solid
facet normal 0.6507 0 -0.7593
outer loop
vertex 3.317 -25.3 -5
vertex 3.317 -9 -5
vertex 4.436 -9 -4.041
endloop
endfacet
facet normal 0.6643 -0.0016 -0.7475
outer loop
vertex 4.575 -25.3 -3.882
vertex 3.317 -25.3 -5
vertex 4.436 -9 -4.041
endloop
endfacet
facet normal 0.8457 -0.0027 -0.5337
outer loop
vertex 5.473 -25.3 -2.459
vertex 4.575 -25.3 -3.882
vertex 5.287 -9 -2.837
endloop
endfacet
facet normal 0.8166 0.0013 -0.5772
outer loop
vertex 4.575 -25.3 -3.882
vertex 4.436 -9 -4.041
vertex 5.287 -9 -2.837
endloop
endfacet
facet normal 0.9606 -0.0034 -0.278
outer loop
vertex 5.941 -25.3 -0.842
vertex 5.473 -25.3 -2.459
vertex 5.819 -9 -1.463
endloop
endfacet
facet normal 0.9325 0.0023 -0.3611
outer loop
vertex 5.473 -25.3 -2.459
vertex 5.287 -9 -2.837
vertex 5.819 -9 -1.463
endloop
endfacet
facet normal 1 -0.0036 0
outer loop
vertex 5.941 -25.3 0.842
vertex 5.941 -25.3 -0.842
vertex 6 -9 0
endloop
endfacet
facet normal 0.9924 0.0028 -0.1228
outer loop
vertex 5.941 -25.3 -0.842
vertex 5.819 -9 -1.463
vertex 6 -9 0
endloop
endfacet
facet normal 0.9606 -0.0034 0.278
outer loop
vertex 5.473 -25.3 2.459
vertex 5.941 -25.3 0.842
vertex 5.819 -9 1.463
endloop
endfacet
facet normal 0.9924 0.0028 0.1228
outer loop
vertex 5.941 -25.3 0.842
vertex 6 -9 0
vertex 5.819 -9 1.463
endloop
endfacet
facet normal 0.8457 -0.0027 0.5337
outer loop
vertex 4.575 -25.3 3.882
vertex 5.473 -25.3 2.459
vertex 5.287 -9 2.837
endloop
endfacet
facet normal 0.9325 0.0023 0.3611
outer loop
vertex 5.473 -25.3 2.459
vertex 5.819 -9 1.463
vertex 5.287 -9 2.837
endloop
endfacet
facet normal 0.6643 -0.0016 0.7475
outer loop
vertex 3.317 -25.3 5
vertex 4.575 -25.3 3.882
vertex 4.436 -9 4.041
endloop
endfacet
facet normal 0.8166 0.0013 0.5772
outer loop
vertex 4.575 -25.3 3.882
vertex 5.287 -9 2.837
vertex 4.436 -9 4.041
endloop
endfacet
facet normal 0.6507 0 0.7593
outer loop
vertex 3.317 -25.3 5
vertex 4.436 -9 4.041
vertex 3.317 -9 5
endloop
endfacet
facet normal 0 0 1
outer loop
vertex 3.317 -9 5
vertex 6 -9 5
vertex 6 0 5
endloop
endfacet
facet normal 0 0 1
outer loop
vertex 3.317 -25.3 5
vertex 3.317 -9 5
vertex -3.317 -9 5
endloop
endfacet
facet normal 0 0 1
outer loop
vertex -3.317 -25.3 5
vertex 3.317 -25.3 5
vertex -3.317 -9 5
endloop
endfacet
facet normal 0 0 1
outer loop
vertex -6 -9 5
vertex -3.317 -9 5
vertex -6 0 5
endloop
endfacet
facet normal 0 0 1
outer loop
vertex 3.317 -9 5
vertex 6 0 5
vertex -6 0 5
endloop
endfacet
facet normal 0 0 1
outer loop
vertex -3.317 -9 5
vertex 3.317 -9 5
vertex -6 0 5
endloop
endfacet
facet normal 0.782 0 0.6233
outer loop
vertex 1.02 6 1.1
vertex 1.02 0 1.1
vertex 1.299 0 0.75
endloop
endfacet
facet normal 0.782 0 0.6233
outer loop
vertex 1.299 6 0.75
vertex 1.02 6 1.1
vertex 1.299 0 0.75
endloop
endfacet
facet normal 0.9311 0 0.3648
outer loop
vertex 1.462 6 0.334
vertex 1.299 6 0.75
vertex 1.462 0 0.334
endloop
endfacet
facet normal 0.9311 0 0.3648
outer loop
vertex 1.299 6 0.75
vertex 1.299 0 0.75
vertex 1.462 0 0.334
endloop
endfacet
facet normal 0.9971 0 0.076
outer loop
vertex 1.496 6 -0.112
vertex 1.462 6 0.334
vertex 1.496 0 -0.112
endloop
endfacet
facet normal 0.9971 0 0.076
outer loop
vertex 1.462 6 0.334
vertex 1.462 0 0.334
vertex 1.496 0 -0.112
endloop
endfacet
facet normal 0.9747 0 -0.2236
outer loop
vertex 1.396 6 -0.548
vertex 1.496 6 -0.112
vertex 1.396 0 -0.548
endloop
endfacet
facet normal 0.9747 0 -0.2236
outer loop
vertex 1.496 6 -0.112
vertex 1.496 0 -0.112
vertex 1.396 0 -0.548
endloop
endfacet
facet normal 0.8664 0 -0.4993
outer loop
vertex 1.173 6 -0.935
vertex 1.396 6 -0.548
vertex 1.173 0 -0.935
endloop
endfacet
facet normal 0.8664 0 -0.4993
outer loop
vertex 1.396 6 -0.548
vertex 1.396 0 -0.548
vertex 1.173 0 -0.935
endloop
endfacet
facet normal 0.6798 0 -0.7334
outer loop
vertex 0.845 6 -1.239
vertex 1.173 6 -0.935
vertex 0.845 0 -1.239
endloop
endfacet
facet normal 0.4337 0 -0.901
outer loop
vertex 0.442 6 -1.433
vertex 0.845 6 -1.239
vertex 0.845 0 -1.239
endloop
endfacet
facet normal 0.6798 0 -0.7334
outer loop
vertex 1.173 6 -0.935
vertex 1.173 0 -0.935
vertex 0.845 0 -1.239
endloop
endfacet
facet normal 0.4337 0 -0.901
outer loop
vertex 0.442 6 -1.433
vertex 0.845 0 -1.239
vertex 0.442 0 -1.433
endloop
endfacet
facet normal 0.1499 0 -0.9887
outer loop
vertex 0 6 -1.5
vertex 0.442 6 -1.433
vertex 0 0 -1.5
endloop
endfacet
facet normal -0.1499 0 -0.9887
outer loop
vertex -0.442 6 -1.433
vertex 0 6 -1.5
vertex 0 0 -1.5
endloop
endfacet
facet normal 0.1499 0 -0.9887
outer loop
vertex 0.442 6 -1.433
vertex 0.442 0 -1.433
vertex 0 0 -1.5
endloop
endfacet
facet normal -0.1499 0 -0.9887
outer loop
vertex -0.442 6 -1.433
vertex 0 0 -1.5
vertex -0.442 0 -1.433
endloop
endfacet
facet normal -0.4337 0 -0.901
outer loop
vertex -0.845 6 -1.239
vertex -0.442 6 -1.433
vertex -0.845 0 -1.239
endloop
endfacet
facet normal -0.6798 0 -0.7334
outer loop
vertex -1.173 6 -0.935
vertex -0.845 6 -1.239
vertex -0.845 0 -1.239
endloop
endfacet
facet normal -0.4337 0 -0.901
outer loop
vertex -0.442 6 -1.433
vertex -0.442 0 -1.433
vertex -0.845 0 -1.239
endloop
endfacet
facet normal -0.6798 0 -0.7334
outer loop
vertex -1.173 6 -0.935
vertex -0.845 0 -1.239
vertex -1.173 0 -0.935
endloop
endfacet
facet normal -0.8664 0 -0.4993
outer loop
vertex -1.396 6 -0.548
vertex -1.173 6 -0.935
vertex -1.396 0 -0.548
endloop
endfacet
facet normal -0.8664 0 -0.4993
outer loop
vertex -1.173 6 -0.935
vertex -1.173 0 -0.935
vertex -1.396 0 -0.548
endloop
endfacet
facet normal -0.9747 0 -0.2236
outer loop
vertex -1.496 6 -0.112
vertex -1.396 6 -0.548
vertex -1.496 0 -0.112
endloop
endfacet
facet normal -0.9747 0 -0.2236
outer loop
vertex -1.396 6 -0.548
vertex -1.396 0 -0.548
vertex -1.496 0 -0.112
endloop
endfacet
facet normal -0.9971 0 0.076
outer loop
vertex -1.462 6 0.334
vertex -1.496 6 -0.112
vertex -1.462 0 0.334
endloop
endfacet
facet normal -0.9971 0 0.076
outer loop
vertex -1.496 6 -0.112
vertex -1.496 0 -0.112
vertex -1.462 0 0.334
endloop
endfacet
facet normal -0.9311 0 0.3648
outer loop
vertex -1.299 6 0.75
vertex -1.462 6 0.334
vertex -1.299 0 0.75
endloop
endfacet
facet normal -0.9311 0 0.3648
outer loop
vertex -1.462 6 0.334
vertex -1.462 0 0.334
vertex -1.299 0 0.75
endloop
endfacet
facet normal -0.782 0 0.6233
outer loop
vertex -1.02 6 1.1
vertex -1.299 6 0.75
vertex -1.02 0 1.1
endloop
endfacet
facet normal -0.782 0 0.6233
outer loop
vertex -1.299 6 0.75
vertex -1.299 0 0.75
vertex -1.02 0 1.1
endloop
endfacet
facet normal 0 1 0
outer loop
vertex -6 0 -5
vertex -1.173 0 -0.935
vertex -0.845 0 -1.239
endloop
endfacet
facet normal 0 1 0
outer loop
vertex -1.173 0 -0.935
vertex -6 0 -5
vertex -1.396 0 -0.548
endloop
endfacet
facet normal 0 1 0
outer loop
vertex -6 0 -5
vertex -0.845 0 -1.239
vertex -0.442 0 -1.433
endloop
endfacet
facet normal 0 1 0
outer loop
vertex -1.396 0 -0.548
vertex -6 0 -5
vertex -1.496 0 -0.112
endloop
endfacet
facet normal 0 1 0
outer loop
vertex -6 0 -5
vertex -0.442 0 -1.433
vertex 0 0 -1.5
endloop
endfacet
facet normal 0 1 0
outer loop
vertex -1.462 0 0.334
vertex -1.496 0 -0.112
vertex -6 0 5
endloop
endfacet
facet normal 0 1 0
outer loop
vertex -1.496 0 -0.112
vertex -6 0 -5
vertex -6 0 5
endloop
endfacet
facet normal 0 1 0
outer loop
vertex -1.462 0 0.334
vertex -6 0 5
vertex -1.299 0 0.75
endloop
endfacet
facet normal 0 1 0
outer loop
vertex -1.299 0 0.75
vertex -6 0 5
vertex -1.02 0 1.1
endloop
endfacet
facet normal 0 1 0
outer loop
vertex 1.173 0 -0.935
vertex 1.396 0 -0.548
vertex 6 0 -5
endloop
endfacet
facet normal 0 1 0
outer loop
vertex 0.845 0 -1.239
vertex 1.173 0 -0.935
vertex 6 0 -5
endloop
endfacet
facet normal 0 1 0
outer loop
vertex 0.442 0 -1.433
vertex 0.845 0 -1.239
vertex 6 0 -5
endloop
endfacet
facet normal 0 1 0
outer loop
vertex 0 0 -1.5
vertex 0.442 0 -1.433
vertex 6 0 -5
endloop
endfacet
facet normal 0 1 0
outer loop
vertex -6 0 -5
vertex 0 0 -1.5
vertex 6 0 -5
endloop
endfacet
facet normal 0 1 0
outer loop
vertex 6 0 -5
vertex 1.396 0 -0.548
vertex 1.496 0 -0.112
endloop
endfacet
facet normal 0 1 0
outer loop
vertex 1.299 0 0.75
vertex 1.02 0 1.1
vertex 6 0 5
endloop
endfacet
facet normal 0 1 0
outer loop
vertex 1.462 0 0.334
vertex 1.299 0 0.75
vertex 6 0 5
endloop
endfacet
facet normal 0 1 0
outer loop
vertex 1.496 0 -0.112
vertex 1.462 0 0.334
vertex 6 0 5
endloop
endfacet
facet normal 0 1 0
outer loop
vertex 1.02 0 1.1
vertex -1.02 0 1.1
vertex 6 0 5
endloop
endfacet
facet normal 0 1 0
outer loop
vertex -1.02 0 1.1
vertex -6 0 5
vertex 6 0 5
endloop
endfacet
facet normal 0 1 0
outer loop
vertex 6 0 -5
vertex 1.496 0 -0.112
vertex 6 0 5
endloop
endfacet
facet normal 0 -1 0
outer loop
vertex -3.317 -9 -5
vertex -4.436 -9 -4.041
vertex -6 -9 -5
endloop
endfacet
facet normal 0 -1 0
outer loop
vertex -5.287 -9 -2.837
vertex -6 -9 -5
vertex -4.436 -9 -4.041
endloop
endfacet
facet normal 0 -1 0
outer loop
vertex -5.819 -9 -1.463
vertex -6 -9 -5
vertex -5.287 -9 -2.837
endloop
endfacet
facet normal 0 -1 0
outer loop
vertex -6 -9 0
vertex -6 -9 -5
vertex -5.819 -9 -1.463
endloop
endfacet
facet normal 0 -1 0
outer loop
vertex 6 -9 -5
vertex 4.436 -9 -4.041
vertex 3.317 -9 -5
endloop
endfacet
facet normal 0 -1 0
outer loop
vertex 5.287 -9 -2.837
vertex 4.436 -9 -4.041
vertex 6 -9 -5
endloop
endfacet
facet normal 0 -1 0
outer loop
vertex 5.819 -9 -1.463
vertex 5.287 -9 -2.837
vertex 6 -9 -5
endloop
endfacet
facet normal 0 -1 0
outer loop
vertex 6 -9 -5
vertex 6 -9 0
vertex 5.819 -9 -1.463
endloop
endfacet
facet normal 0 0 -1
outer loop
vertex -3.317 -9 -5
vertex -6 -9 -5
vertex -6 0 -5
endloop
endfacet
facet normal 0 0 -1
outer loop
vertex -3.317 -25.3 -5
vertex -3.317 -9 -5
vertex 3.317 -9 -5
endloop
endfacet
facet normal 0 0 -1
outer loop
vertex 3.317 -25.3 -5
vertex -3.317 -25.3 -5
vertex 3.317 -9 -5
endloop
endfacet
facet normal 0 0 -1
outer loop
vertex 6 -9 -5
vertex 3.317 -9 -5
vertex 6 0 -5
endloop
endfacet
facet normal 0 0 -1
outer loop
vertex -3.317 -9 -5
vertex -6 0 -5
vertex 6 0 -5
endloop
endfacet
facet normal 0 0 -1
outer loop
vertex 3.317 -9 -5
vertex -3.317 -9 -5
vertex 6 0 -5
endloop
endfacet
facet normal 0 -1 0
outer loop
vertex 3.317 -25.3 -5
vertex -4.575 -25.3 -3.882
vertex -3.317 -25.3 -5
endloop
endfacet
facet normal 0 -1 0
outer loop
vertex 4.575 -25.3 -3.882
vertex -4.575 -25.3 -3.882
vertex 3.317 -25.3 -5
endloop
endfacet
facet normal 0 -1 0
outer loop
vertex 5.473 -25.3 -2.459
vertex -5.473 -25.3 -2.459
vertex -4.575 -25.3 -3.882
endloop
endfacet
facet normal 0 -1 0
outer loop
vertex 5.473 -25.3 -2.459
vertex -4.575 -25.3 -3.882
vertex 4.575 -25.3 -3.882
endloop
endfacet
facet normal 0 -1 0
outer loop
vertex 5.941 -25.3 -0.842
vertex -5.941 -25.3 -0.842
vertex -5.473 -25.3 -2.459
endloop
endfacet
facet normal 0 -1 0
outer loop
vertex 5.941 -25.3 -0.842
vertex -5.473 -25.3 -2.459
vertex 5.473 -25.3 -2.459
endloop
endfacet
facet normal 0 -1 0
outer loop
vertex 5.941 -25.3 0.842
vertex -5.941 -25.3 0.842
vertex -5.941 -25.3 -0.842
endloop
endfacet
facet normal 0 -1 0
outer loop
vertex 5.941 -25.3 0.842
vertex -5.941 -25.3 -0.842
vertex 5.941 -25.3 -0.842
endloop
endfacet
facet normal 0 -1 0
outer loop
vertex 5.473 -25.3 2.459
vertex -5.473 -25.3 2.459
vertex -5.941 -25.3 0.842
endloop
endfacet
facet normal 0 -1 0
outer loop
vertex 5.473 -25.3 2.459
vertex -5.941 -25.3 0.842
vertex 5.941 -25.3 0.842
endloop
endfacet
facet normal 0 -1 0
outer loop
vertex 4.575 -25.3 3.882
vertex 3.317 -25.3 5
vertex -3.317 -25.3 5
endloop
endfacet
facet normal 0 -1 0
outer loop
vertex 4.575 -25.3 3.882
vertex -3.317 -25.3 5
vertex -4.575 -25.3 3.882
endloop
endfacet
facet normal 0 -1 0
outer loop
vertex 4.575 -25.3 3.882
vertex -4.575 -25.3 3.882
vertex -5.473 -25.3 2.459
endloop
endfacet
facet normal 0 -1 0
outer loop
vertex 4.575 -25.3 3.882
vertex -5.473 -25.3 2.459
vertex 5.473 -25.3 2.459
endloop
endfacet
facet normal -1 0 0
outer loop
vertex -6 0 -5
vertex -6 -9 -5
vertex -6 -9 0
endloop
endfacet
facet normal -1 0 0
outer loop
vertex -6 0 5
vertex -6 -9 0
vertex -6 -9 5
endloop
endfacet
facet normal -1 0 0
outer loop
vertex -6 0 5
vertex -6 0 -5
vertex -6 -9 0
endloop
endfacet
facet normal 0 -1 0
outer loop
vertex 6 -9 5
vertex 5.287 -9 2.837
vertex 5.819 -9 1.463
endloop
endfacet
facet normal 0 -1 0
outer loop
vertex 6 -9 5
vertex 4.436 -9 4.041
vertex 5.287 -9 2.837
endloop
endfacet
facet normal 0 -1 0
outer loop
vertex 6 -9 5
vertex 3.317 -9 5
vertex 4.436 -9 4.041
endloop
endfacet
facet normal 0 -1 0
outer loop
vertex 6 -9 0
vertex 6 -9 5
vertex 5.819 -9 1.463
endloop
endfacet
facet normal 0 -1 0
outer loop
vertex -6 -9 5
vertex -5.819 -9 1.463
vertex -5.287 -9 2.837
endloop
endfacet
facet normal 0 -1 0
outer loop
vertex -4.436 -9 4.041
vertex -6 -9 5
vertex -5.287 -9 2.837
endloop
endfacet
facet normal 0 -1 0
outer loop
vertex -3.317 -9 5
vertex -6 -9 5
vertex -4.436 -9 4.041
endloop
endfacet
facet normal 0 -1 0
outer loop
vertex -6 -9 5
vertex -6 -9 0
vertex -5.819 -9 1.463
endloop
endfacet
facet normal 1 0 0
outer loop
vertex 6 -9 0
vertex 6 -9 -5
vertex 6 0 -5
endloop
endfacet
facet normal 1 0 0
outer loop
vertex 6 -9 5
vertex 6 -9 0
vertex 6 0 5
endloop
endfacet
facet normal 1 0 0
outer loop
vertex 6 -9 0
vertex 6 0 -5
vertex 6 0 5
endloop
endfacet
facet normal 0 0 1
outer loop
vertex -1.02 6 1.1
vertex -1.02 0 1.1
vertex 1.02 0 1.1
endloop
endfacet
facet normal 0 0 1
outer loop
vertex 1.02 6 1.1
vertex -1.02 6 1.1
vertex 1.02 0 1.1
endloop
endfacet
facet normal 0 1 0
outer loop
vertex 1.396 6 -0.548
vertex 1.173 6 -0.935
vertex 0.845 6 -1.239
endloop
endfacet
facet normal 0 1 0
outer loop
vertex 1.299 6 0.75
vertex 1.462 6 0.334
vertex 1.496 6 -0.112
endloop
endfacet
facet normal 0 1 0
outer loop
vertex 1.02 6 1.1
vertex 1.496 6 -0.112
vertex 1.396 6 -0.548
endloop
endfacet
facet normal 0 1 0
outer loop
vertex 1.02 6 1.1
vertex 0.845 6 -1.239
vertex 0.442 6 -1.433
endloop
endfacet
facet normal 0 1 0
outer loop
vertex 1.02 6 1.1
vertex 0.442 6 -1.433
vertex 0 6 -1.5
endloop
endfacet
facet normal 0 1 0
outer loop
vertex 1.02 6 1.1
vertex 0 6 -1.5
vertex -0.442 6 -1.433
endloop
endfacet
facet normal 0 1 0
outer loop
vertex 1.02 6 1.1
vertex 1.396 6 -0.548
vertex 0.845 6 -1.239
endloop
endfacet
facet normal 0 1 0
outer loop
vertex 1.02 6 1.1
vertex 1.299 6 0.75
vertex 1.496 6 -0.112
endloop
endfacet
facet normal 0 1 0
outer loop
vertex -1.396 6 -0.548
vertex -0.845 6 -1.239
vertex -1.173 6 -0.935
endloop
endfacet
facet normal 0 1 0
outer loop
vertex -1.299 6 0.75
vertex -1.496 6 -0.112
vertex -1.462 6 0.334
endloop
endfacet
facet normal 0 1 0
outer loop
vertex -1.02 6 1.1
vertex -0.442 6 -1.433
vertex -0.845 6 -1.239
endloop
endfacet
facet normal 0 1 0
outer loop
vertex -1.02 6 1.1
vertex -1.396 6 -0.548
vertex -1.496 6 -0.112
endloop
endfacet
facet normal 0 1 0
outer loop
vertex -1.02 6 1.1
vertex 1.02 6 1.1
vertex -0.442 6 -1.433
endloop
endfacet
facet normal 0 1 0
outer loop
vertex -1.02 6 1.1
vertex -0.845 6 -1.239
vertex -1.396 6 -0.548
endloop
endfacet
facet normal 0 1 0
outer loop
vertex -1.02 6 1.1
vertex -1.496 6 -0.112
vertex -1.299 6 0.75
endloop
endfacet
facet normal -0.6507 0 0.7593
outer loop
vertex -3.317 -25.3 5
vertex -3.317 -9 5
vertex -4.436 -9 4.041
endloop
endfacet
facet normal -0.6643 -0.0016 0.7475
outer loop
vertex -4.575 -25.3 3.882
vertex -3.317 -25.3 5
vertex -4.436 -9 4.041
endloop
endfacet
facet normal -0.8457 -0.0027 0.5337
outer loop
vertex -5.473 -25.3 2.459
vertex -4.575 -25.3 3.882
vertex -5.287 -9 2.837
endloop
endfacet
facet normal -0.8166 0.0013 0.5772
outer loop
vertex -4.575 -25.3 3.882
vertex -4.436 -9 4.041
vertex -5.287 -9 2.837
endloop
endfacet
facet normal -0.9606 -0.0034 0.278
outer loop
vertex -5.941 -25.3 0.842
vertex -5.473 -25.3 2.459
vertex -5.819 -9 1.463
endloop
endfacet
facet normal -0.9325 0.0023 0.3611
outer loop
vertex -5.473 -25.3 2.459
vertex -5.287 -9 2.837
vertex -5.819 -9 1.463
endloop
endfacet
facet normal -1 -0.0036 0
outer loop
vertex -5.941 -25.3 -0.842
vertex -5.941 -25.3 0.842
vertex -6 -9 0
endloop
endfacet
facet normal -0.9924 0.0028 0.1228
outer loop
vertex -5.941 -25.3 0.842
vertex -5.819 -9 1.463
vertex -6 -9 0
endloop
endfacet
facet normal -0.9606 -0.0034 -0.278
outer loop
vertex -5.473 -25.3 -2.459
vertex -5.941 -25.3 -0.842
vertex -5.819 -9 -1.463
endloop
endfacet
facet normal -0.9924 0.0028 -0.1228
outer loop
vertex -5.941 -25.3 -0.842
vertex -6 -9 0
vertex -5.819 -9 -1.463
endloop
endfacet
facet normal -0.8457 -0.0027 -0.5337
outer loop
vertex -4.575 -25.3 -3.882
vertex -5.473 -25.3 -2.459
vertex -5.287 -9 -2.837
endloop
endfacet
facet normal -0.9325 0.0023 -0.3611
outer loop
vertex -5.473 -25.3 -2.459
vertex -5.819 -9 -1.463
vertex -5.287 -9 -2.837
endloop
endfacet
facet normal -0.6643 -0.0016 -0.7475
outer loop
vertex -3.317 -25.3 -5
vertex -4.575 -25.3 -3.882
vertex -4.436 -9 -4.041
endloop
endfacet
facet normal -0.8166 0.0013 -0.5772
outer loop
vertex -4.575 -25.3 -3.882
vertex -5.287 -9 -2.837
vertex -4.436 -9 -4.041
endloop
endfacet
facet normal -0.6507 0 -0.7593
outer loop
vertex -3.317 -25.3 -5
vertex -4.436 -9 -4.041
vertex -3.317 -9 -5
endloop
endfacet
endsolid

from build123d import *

# Parameters (mm, degrees)
F0_W     = 12
F0_H     = 10
F1_DEPTH = 9
F3_DEPTH = 16.3
F5_DEPTH = 6


with BuildPart() as f1:
    # F0 (on Front) → F1 (new body)
    with BuildSketch(Plane.XZ):
        Rectangle(F0_W, F0_H)
    extrude(amount=F1_DEPTH)

    # F2 (on face) → F3 (join)
    with BuildSketch(Plane.XZ.offset(9)):
        with BuildLine():
            Line((3.316625, 5), (-3.316625, 5))
            ThreePointArc((-3.316625, 5), (-6, 0), (-3.316625, -5))
            Line((-3.316625, -5), (3.316625, -5))
            ThreePointArc((3.316625, -5), (6, 0), (3.316625, 5))
        make_face()
    extrude(amount=F3_DEPTH)

    # F4 (on face) → F5 (join)
    with BuildSketch(Plane(origin=(0, 0, 0), x_dir=(-1, 0, 0), z_dir=(0, 1, 0))):
        with BuildLine():
            Line((1.019804, 1.1), (-1.019804, 1.1))
            ThreePointArc((-1.019804, 1.1), (0, -1.5), (1.019804, 1.1))
        make_face()
    extrude(amount=F5_DEPTH)


solid = f1.part
